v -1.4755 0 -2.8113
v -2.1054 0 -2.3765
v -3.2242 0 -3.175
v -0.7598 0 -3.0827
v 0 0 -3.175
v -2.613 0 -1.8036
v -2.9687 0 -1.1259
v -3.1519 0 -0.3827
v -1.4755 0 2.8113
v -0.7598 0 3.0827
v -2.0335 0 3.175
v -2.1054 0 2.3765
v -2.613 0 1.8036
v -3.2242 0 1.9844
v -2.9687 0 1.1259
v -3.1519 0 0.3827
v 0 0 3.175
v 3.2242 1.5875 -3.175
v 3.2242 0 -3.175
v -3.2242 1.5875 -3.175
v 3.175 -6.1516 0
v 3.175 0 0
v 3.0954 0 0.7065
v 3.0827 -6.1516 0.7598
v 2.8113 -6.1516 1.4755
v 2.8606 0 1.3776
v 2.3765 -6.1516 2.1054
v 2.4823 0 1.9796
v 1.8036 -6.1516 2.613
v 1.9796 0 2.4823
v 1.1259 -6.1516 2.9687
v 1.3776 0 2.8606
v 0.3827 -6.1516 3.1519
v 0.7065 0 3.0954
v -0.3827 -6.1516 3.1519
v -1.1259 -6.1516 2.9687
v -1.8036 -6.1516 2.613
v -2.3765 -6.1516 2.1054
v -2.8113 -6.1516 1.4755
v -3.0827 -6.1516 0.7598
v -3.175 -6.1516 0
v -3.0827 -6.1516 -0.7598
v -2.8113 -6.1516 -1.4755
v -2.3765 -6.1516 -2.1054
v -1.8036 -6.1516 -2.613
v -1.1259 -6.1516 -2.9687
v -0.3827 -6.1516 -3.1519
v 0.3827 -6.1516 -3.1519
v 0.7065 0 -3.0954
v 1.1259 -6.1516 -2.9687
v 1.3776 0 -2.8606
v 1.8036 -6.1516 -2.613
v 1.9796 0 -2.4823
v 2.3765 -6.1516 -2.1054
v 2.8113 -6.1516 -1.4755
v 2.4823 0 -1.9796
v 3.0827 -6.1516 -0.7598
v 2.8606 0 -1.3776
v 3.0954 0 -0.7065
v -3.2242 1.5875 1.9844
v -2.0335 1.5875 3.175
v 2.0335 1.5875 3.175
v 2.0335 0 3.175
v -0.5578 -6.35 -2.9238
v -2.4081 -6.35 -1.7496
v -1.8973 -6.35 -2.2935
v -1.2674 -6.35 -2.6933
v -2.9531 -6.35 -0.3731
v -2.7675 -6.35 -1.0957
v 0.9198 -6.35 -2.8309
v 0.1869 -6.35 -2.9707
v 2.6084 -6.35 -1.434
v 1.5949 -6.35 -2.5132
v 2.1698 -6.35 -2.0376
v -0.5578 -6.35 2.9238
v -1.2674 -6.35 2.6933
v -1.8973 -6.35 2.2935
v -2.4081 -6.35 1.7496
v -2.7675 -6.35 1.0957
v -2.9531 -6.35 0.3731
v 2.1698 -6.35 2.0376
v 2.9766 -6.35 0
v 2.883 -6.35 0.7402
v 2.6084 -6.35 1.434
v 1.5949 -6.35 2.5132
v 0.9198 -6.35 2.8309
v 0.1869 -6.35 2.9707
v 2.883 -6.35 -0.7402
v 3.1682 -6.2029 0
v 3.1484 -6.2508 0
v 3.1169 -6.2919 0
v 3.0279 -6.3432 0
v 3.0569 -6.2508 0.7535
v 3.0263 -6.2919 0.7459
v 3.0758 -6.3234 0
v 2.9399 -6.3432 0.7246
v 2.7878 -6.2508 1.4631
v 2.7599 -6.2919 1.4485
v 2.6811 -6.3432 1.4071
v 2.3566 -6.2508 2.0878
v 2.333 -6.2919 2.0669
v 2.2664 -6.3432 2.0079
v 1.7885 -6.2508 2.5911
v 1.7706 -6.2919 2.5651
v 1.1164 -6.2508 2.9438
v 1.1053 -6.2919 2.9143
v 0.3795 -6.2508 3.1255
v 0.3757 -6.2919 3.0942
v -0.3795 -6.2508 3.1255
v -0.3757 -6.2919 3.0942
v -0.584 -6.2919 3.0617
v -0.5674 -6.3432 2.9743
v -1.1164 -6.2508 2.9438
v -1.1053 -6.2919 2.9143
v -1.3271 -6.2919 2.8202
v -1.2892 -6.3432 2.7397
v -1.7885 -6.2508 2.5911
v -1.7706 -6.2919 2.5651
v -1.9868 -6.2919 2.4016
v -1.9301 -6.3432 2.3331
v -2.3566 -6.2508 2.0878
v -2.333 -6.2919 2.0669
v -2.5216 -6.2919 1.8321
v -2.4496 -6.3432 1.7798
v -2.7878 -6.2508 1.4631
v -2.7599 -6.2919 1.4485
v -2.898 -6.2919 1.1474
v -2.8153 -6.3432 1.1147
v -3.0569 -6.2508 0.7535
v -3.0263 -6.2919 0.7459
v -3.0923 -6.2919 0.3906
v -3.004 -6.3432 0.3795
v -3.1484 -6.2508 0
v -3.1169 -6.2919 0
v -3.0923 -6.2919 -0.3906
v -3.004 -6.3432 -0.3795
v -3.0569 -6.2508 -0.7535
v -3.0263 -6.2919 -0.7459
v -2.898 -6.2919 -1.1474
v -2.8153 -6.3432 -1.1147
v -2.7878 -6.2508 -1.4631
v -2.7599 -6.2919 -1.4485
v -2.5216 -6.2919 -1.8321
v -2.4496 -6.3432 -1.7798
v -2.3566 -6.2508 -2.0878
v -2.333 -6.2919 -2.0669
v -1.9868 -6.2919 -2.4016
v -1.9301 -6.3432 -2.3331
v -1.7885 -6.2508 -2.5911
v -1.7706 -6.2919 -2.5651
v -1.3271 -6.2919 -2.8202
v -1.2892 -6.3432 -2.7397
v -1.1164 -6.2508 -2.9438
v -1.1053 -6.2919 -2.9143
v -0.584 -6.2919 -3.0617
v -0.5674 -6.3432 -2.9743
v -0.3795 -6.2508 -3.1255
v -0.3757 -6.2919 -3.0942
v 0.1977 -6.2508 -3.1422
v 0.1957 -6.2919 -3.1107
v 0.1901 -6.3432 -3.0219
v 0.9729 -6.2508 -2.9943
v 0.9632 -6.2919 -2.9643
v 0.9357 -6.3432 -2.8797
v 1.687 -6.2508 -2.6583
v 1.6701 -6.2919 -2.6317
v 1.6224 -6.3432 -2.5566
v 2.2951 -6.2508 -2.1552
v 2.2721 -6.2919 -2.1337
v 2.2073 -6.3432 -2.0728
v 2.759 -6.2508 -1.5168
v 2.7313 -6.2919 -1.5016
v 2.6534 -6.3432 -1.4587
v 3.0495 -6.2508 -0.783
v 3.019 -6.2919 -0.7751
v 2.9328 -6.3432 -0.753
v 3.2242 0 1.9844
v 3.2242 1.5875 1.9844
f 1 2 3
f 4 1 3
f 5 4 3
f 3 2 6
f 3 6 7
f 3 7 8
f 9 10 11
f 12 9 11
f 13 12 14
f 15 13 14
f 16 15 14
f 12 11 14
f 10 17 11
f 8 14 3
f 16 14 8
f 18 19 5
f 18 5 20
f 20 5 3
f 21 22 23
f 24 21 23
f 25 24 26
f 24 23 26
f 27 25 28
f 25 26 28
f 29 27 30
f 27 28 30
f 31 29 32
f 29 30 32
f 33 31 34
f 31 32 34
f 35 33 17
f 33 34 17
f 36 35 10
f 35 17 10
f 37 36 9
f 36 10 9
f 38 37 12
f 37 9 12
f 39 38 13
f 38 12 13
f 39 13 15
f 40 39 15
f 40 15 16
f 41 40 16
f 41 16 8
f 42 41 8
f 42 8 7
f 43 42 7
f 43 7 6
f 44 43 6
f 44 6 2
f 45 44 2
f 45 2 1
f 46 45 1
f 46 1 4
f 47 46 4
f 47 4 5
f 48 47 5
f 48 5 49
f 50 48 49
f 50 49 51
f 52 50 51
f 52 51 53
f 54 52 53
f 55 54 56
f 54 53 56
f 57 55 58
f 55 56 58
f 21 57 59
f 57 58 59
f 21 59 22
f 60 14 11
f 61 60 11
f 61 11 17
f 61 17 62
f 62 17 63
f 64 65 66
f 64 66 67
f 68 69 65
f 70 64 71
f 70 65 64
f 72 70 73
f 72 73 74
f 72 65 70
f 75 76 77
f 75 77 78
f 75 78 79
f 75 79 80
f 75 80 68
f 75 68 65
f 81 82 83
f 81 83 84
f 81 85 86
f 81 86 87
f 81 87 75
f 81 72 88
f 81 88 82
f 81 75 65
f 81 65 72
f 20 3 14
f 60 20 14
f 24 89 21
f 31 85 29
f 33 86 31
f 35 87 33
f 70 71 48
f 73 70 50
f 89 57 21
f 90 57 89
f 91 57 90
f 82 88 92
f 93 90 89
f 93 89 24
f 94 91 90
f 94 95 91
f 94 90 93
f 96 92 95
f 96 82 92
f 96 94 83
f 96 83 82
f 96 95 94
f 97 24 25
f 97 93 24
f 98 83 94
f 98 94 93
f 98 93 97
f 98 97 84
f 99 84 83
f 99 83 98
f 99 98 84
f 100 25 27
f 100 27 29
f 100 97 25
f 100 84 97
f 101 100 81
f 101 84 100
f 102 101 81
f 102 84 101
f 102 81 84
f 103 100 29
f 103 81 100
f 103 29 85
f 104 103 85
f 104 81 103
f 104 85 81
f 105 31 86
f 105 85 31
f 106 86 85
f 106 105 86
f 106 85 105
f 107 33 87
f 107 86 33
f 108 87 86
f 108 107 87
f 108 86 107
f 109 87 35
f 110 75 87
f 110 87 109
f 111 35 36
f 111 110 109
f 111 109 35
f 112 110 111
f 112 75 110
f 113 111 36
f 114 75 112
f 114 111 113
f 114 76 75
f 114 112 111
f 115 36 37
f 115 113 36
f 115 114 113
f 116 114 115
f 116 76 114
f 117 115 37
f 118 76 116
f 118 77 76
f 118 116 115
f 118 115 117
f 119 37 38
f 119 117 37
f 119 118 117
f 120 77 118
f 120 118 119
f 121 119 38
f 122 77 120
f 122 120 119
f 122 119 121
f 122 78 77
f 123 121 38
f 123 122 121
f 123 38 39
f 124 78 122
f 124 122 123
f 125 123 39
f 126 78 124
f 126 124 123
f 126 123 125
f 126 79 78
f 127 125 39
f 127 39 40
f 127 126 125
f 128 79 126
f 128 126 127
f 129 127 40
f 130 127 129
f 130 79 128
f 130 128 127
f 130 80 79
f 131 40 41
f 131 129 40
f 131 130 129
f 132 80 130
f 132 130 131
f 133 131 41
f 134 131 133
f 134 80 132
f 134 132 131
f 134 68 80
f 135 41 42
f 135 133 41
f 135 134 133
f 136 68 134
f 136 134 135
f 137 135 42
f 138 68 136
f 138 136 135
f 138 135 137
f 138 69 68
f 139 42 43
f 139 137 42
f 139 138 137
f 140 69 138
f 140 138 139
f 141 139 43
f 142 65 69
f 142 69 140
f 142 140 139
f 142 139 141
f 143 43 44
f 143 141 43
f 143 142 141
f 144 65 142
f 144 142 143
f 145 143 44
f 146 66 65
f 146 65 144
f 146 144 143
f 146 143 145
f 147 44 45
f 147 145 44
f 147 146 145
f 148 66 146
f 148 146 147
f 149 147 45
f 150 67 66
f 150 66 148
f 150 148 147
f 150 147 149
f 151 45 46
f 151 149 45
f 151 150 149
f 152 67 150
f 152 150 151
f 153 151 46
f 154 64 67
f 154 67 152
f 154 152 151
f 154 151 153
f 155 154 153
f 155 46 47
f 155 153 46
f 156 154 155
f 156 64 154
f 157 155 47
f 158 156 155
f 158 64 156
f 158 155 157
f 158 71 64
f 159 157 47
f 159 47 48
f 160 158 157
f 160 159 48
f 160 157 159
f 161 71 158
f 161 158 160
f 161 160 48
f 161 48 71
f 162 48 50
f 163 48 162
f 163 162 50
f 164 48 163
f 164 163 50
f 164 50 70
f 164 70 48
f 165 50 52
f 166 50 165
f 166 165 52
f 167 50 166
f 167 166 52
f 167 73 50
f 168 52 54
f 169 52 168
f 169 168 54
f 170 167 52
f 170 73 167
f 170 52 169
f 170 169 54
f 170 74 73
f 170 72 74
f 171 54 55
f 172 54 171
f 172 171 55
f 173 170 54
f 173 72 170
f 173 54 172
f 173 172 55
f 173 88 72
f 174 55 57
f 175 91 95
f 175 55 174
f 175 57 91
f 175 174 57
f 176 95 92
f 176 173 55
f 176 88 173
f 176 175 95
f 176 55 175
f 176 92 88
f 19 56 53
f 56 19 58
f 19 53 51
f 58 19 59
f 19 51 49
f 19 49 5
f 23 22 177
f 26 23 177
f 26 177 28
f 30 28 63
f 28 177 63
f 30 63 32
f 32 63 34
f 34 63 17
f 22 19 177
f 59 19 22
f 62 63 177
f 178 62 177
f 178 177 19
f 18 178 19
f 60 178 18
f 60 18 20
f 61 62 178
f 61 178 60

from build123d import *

# Parameters (mm, degrees)
F0_R     = 3.175
F1_DEPTH = 6.35
F3_DEPTH = 1.5875
F4_R     = 0.1984375


with BuildPart() as f1:
    # F0 (on Front) → F1 (new body)
    with BuildSketch(Plane.XZ):
        Circle(F0_R)
    extrude(amount=F1_DEPTH)

    # F2 (on face) → F3 (join)
    with BuildSketch(Plane(origin=(0, 0, 0), x_dir=(-1, 0, 0), z_dir=(0, 1, 0))):
        with BuildLine():
            Line((0, 3.175), (-2.033528515, 3.175))
            Line((-2.033528515, 3.175), (-3.224153515, 1.984375))
            Line((-3.224153515, 1.984375), (-3.224153515, -3.175))
            Line((-3.224153515, -3.175), (0, -3.175))
            ThreePointArc((0, -3.175), (-3.175, 0), (0, 3.175))
        make_face()
        with BuildLine():
            Line((2.033528515, 3.175), (0, 3.175))
            ThreePointArc((0, 3.175), (2.2450640303, 2.2450640303), (3.175, 0))
            ThreePointArc((3.175, 0), (2.2450640303, -2.2450640303), (0, -3.175))
            Line((0, -3.175), (3.224153515, -3.175))
            Line((3.224153515, -3.175), (3.224153515, 1.984375))
            Line((3.224153515, 1.984375), (2.033528515, 3.175))
        make_face()
        with BuildLine():
            ThreePointArc((3.175, 0), (2.2450640303, 2.2450640303), (0, 3.175))
            ThreePointArc((0, 3.175), (-3.175, 0), (0, -3.175))
            ThreePointArc((0, -3.175), (2.2450640303, -2.2450640303), (3.175, 0))
        make_face()
    extrude(amount=F3_DEPTH)

    # F4
    f4_edges = [f1.edges().sort_by_distance(p)[0] for p in [
        (-3.175, -6.35, 0),
    ]]
    fillet(f4_edges, radius=F4_R)


solid = f1.part
